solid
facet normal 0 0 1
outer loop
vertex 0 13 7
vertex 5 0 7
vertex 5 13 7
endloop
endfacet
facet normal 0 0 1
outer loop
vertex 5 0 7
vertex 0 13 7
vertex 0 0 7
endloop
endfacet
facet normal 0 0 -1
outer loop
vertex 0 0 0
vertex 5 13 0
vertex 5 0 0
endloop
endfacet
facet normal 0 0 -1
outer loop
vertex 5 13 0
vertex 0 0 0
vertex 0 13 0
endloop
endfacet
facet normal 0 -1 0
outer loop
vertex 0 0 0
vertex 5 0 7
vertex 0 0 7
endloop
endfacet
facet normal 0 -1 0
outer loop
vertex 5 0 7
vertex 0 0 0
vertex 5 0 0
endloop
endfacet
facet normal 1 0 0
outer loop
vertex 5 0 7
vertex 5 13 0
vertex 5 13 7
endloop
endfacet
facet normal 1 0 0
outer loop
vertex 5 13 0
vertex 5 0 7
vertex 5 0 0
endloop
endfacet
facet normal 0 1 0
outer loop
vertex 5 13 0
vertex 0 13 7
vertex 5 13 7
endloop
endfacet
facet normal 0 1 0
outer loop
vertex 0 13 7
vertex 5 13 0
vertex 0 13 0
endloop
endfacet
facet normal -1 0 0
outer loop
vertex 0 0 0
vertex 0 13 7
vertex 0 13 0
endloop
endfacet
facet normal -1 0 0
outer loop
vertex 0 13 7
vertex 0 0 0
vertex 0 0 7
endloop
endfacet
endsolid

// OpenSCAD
// Generated by SolidPython 1.0.1 on 2020-07-29 00:46:54


cube(size = [5, 13, 7]);
/***********************************************
*********      SolidPython code:      **********
************************************************
 
# import packages: SolidPython
from solid import *
from solid.utils import *
from itertools import chain, combinations, permutations


class Resize:

    def __init__(self, scad_file):
        self.scad_file = scad_file
        #self.scad_file = import_scad(scad_file)
        # cone/cylinder param:
        self.r1 = 0
        self.r2 = 0
        self.h = 0
        # rectangular prism param:
        self.w = 0
        self.l = 0
        # ellipse param:
        self.r = 0

    # import OpenScad code (file name corresponds to shape)


    # classify shape + parameters
    def assign(self, param1, param2, param3):
        if self.scad_file == 'cone.scad':
            self.r1 = param1
            self.r2 = param2
            self.h = param3
        elif self.scad_file == 'cylinder.scad':
            self.r1 = param1
            self.r2 = param2
            self.h = param3
        elif self.scad_file == 'rectangularPrism.scad':
            self.h = param1
            self.l = param2
            self.w = param3
        else:
            self.r = param1
            self.h = param2

    # resize parameters
    def iterate(self):
        x = range(3, 20, 2)
        i = 1
        if self.scad_file == 'cone.scad':
            tempList = list(permutations(x, 2))
            for temp in tempList:
                param1 = temp[0]
                param2 = temp[1]
                filepath = 'produced_scad_files/' + 'cone' + str(param1) + '_' + str(param2) + '_' + '.scad'
                scad_render_to_file(cylinder(h=param1, r1=param2, r2=0), filepath)

        elif self.scad_file == 'cylinder.scad':
            tempList = list(permutations(x, 3))
            for temp in tempList:
                param1 = temp[0]
                param2 = temp[1]
                filepath = 'produced_scad_files/' + 'cylinder' + str(param1) + '_' + str(param2) + '_' + '.scad'
                scad_render_to_file(cylinder(h=param1, r1=param2, r2=param2), filepath)

        elif self.scad_file == 'rectangularPrism.scad':
            tempList = list(permutations(x, 3))
            for temp in tempList:
                param1 = temp[0]
                param2 = temp[1]
                param3 = temp[2]
                filepath = 'produced_scad_files/' + 'rectangularPrism' + str(param1) + '_' + str(param2) + '_' + str(
                    param3) + '.scad'
                scad_render_to_file(cube(size=(param1, param2, param3)), filepath)

        elif self.scad_file == 'ellipse.scad':
            tempList = list(permutations(x, 4))
            for temp in tempList:
                param1 = temp[0]
                param2 = temp[1]
                param3 = temp[2]
                param4 = temp[3]
                filepath = 'produced_scad_files/' + 'ellipse' + str(param1) + '_' + str(param2) + '_' + str(param3) + '_' + str(param4) + '.scad'
                scad_render_to_file(scale([param1, param2, param3])(sphere(r=param4)), filepath)

    def render_to_scadfile(self):
        scad_render_to_file(scad, 'example.scad') 
 
************************************************/
